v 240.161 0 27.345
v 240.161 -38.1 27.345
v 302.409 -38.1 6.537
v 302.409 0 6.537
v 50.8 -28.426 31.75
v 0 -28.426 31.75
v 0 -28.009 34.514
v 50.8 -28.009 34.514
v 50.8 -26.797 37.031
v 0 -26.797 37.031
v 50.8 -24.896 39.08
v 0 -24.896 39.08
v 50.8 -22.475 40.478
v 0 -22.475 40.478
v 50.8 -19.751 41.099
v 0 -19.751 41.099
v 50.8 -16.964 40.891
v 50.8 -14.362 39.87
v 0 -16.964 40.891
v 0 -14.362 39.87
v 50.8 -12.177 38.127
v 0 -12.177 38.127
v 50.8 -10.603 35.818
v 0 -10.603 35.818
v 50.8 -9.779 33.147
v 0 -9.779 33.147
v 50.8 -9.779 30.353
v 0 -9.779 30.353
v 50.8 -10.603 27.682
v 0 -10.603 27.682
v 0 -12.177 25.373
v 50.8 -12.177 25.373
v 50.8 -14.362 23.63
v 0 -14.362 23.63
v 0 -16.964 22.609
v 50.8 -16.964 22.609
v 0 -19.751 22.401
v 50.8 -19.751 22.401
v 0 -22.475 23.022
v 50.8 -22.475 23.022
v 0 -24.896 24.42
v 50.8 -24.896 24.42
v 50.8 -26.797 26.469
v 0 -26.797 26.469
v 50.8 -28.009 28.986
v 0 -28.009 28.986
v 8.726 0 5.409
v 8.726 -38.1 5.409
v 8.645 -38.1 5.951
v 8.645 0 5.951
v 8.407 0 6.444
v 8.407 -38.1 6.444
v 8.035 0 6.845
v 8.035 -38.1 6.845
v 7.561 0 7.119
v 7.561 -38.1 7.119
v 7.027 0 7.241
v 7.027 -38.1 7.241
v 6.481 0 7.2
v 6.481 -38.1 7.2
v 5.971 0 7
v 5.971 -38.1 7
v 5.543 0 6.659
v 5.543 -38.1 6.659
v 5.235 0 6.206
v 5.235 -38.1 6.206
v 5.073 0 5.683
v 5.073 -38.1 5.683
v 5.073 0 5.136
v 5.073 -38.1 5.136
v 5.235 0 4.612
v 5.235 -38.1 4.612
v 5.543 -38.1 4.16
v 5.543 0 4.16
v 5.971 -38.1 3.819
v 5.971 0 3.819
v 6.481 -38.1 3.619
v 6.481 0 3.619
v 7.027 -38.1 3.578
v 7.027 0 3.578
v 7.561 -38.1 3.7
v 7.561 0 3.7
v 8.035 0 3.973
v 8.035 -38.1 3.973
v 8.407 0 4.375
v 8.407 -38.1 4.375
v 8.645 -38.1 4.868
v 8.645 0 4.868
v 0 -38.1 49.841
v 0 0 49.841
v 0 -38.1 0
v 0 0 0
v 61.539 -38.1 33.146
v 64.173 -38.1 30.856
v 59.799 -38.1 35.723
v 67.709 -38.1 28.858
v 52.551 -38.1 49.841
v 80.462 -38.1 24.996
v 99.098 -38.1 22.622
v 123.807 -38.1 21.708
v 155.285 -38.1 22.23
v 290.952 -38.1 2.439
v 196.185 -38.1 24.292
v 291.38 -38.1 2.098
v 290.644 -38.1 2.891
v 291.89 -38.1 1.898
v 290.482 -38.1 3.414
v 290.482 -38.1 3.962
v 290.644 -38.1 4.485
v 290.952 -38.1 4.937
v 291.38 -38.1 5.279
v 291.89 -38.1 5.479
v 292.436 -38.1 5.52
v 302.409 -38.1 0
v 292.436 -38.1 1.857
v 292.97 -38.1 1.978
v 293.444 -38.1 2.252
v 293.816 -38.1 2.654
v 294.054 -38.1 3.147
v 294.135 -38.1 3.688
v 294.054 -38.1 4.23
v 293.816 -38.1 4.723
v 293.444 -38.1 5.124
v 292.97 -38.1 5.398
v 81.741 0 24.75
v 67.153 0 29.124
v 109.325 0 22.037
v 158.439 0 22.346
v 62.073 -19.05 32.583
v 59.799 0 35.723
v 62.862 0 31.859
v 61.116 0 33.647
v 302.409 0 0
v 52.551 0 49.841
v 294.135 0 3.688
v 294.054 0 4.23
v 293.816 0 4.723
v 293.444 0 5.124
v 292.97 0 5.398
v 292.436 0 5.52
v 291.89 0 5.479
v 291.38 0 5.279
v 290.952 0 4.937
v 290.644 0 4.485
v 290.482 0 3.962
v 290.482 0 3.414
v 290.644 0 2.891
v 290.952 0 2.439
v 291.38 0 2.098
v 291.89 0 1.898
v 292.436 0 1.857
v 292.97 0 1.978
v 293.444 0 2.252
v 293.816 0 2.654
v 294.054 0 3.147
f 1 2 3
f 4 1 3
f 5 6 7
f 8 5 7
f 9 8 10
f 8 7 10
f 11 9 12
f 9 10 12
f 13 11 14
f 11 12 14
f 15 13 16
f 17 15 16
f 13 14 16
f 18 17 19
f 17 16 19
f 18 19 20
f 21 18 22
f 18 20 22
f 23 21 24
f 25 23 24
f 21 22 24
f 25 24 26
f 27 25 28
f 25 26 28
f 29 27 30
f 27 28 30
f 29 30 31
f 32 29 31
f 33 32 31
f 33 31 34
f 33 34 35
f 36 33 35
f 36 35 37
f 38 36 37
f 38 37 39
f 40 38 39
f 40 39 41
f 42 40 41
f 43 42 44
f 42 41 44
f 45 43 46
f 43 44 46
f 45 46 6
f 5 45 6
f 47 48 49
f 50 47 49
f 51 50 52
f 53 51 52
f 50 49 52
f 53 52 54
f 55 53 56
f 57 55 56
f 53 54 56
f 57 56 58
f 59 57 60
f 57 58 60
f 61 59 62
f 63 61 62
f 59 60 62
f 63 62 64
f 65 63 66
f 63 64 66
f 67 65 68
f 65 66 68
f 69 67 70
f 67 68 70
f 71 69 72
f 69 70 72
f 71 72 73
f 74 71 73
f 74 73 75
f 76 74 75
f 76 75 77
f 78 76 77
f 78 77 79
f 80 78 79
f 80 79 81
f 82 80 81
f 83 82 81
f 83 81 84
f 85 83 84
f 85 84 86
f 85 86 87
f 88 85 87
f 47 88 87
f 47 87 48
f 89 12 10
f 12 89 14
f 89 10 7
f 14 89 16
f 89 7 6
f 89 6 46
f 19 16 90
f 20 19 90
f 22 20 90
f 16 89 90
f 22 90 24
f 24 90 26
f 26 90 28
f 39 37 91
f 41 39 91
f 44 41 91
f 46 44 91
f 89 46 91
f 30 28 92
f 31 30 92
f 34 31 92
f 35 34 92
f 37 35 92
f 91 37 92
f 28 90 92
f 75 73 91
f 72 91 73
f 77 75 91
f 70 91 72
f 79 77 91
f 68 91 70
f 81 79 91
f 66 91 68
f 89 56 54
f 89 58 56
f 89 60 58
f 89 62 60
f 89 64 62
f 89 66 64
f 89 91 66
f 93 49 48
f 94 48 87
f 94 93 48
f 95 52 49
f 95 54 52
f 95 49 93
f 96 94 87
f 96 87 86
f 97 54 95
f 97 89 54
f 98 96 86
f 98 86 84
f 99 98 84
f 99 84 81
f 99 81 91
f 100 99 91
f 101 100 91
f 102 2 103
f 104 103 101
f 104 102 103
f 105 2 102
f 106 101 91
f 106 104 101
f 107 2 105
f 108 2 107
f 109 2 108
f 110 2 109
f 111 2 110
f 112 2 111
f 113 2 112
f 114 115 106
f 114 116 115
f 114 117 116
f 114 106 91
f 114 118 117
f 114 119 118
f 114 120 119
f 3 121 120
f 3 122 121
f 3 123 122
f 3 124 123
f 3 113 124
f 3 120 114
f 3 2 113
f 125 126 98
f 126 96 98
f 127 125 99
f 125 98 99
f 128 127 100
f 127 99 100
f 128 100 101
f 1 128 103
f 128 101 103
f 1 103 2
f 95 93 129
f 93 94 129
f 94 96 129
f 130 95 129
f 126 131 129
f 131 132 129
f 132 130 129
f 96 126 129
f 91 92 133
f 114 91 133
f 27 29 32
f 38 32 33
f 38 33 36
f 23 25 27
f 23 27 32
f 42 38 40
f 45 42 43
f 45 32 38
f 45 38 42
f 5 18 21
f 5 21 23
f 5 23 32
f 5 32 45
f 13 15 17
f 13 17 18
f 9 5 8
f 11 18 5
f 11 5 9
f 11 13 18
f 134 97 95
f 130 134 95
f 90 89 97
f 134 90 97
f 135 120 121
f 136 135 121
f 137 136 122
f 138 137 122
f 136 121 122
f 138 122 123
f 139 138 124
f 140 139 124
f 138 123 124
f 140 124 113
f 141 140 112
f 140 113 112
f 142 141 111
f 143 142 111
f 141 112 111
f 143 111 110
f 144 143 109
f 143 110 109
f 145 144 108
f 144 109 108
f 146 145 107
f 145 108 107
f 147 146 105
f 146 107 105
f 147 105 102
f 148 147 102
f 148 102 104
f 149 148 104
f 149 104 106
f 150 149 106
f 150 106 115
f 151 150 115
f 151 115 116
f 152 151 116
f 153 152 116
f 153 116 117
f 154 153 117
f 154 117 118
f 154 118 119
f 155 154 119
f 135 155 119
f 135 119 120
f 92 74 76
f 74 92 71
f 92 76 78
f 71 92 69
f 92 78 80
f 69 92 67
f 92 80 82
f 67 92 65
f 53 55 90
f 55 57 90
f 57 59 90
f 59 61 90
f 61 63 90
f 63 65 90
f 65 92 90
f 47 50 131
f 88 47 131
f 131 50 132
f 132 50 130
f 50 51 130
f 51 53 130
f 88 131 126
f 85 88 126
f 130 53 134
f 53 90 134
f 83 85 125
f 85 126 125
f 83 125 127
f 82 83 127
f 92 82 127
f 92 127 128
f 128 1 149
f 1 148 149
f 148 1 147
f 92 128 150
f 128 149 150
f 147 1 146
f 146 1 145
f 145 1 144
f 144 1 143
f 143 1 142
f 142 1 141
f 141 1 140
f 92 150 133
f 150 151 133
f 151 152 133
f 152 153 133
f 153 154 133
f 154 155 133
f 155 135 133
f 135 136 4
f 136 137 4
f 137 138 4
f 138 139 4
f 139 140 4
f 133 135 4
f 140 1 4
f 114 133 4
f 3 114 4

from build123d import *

# Parameters (mm, degrees)
F1_DEPTH  = 38.1
F2_R      = 9.3756609964
F3_DEPTH  = 50.8
F5_DEPTH  = 76.2
F7_DEPTH  = 76.2
F9_DEPTH  = 76.2
F11_DEPTH = 76.2
F13_DEPTH = 76.2
F14_R     = 1.8366933485
F16_DEPTH = 76.2
F15_R     = 1.8367030573
F17_DEPTH = 76.2


with BuildPart() as f1:
    # F0 (on Front) → F1 (new body)
    with BuildSketch(Plane.XZ):
        Polygon((0, 63.5), (0, 0), (302.4093748547, 0), (302.4093748547, 25.4), align=None)
    extrude(amount=F1_DEPTH)

    # F2 (on face) → F3 (cut)
    with BuildSketch(Plane(origin=(0, 0, 0), x_dir=(0, -1, 0), z_dir=(-1, 0, 0))):
        with Locations((19.05, 31.75)):
            Circle(F2_R)
    extrude(amount=-F3_DEPTH, mode=Mode.SUBTRACT)

    # F4 (on face) → F5 (cut)
    with BuildSketch(Plane.XZ.offset(38.1)):
        with BuildLine():
            Line((269.3568159992, 29.5642309965), (61.5471690917, 55.7457855564))
            add(Edge.make_bspline(
                [(61.5471690917, 55.7457855564), (58.8507788185, 47.0996876999), (48.0888197805, 12.590977334), (174.5673004743, 22.2930190768), (269.3568159992, 29.5642309965)],
                knots=[0, 0, 0, 0, 0.2505482751, 1, 1, 1, 1], degree=3))
        make_face()
    extrude(amount=-F5_DEPTH, mode=Mode.SUBTRACT)

    # F6 (on face) → F7 (cut)
    with BuildSketch(Plane.XZ.offset(38.1)):
        with BuildLine():
            Line((0, 63.5), (0, 49.8412624001))
            Line((0, 49.8412624001), (59.7987414655, 49.8412624001))
            add(Edge.make_bspline(
                [(61.5471690917, 55.7457855564), (60.9299090319, 53.7665131444), (60.3126489722, 51.7872407325), (59.7987414655, 49.8412624001)],
                knots=[0, 0, 0, 0, 0.057355734, 0.057355734, 0.057355734, 0.057355734], degree=3))
            Line((61.5471690917, 55.7457855564), (0, 63.5))
        make_face()
    extrude(amount=-F7_DEPTH, mode=Mode.SUBTRACT)

    # F8 (on face) → F9 (cut)
    with BuildSketch(Plane.XZ.offset(38.1)):
        with BuildLine():
            Line((59.7987414655, 49.8412624001), (52.5512769818, 49.8412624001))
            Line((52.5512769818, 49.8412624001), (59.7987414652, 35.7225287025))
            add(Edge.make_bspline(
                [(59.7987414655, 49.8412624001), (58.4403182232, 44.6974142144), (57.8040351338, 39.7861968724), (59.7987414652, 35.7225287025)],
                knots=[0.057355734, 0.057355734, 0.057355734, 0.057355734, 0.2089654324, 0.2089654324, 0.2089654324, 0.2089654324], degree=3))
        make_face()
    extrude(amount=-F9_DEPTH, mode=Mode.SUBTRACT)

    # F10 (on face) → F11 (cut)
    with BuildSketch(Plane.XZ.offset(38.1)):
        Polygon((302.4093748547, 25.4), (269.3568159992, 29.5642309965), (302.4093748547, 6.536568515), align=None)
    extrude(amount=-F11_DEPTH, mode=Mode.SUBTRACT)

    # F12 (on face) → F13 (cut)
    with BuildSketch(Plane.XZ.offset(38.1)):
        with BuildLine():
            add(Edge.make_bspline(
                [(240.1607868718, 27.3452845776), (249.8366976467, 28.0668616255), (259.596756823, 28.815546311), (269.3568159992, 29.5642309965)],
                knots=[0.9228322548, 0.9228322548, 0.9228322548, 0.9228322548, 1, 1, 1, 1], degree=3))
            Line((240.1607868718, 27.3452845776), (302.4093748547, 6.536568515))
            Line((302.4093748547, 6.536568515), (269.3568159992, 29.5642309965))
        make_face()
    extrude(amount=-F13_DEPTH, mode=Mode.SUBTRACT)

    # F14 (on face) → F16 (cut)
    with BuildSketch(Plane.XZ.offset(38.1)):
        with Locations((6.889551878, 5.4092812352)):
            Circle(F14_R)
    extrude(amount=-F16_DEPTH, mode=Mode.SUBTRACT)

    # F15 (on face) → F17 (cut)
    with BuildSketch(Plane.XZ.offset(38.1)):
        with Locations((292.2985553741, 3.6882217973)):
            Circle(F15_R)
    extrude(amount=-F17_DEPTH, mode=Mode.SUBTRACT)


solid = f1.part
